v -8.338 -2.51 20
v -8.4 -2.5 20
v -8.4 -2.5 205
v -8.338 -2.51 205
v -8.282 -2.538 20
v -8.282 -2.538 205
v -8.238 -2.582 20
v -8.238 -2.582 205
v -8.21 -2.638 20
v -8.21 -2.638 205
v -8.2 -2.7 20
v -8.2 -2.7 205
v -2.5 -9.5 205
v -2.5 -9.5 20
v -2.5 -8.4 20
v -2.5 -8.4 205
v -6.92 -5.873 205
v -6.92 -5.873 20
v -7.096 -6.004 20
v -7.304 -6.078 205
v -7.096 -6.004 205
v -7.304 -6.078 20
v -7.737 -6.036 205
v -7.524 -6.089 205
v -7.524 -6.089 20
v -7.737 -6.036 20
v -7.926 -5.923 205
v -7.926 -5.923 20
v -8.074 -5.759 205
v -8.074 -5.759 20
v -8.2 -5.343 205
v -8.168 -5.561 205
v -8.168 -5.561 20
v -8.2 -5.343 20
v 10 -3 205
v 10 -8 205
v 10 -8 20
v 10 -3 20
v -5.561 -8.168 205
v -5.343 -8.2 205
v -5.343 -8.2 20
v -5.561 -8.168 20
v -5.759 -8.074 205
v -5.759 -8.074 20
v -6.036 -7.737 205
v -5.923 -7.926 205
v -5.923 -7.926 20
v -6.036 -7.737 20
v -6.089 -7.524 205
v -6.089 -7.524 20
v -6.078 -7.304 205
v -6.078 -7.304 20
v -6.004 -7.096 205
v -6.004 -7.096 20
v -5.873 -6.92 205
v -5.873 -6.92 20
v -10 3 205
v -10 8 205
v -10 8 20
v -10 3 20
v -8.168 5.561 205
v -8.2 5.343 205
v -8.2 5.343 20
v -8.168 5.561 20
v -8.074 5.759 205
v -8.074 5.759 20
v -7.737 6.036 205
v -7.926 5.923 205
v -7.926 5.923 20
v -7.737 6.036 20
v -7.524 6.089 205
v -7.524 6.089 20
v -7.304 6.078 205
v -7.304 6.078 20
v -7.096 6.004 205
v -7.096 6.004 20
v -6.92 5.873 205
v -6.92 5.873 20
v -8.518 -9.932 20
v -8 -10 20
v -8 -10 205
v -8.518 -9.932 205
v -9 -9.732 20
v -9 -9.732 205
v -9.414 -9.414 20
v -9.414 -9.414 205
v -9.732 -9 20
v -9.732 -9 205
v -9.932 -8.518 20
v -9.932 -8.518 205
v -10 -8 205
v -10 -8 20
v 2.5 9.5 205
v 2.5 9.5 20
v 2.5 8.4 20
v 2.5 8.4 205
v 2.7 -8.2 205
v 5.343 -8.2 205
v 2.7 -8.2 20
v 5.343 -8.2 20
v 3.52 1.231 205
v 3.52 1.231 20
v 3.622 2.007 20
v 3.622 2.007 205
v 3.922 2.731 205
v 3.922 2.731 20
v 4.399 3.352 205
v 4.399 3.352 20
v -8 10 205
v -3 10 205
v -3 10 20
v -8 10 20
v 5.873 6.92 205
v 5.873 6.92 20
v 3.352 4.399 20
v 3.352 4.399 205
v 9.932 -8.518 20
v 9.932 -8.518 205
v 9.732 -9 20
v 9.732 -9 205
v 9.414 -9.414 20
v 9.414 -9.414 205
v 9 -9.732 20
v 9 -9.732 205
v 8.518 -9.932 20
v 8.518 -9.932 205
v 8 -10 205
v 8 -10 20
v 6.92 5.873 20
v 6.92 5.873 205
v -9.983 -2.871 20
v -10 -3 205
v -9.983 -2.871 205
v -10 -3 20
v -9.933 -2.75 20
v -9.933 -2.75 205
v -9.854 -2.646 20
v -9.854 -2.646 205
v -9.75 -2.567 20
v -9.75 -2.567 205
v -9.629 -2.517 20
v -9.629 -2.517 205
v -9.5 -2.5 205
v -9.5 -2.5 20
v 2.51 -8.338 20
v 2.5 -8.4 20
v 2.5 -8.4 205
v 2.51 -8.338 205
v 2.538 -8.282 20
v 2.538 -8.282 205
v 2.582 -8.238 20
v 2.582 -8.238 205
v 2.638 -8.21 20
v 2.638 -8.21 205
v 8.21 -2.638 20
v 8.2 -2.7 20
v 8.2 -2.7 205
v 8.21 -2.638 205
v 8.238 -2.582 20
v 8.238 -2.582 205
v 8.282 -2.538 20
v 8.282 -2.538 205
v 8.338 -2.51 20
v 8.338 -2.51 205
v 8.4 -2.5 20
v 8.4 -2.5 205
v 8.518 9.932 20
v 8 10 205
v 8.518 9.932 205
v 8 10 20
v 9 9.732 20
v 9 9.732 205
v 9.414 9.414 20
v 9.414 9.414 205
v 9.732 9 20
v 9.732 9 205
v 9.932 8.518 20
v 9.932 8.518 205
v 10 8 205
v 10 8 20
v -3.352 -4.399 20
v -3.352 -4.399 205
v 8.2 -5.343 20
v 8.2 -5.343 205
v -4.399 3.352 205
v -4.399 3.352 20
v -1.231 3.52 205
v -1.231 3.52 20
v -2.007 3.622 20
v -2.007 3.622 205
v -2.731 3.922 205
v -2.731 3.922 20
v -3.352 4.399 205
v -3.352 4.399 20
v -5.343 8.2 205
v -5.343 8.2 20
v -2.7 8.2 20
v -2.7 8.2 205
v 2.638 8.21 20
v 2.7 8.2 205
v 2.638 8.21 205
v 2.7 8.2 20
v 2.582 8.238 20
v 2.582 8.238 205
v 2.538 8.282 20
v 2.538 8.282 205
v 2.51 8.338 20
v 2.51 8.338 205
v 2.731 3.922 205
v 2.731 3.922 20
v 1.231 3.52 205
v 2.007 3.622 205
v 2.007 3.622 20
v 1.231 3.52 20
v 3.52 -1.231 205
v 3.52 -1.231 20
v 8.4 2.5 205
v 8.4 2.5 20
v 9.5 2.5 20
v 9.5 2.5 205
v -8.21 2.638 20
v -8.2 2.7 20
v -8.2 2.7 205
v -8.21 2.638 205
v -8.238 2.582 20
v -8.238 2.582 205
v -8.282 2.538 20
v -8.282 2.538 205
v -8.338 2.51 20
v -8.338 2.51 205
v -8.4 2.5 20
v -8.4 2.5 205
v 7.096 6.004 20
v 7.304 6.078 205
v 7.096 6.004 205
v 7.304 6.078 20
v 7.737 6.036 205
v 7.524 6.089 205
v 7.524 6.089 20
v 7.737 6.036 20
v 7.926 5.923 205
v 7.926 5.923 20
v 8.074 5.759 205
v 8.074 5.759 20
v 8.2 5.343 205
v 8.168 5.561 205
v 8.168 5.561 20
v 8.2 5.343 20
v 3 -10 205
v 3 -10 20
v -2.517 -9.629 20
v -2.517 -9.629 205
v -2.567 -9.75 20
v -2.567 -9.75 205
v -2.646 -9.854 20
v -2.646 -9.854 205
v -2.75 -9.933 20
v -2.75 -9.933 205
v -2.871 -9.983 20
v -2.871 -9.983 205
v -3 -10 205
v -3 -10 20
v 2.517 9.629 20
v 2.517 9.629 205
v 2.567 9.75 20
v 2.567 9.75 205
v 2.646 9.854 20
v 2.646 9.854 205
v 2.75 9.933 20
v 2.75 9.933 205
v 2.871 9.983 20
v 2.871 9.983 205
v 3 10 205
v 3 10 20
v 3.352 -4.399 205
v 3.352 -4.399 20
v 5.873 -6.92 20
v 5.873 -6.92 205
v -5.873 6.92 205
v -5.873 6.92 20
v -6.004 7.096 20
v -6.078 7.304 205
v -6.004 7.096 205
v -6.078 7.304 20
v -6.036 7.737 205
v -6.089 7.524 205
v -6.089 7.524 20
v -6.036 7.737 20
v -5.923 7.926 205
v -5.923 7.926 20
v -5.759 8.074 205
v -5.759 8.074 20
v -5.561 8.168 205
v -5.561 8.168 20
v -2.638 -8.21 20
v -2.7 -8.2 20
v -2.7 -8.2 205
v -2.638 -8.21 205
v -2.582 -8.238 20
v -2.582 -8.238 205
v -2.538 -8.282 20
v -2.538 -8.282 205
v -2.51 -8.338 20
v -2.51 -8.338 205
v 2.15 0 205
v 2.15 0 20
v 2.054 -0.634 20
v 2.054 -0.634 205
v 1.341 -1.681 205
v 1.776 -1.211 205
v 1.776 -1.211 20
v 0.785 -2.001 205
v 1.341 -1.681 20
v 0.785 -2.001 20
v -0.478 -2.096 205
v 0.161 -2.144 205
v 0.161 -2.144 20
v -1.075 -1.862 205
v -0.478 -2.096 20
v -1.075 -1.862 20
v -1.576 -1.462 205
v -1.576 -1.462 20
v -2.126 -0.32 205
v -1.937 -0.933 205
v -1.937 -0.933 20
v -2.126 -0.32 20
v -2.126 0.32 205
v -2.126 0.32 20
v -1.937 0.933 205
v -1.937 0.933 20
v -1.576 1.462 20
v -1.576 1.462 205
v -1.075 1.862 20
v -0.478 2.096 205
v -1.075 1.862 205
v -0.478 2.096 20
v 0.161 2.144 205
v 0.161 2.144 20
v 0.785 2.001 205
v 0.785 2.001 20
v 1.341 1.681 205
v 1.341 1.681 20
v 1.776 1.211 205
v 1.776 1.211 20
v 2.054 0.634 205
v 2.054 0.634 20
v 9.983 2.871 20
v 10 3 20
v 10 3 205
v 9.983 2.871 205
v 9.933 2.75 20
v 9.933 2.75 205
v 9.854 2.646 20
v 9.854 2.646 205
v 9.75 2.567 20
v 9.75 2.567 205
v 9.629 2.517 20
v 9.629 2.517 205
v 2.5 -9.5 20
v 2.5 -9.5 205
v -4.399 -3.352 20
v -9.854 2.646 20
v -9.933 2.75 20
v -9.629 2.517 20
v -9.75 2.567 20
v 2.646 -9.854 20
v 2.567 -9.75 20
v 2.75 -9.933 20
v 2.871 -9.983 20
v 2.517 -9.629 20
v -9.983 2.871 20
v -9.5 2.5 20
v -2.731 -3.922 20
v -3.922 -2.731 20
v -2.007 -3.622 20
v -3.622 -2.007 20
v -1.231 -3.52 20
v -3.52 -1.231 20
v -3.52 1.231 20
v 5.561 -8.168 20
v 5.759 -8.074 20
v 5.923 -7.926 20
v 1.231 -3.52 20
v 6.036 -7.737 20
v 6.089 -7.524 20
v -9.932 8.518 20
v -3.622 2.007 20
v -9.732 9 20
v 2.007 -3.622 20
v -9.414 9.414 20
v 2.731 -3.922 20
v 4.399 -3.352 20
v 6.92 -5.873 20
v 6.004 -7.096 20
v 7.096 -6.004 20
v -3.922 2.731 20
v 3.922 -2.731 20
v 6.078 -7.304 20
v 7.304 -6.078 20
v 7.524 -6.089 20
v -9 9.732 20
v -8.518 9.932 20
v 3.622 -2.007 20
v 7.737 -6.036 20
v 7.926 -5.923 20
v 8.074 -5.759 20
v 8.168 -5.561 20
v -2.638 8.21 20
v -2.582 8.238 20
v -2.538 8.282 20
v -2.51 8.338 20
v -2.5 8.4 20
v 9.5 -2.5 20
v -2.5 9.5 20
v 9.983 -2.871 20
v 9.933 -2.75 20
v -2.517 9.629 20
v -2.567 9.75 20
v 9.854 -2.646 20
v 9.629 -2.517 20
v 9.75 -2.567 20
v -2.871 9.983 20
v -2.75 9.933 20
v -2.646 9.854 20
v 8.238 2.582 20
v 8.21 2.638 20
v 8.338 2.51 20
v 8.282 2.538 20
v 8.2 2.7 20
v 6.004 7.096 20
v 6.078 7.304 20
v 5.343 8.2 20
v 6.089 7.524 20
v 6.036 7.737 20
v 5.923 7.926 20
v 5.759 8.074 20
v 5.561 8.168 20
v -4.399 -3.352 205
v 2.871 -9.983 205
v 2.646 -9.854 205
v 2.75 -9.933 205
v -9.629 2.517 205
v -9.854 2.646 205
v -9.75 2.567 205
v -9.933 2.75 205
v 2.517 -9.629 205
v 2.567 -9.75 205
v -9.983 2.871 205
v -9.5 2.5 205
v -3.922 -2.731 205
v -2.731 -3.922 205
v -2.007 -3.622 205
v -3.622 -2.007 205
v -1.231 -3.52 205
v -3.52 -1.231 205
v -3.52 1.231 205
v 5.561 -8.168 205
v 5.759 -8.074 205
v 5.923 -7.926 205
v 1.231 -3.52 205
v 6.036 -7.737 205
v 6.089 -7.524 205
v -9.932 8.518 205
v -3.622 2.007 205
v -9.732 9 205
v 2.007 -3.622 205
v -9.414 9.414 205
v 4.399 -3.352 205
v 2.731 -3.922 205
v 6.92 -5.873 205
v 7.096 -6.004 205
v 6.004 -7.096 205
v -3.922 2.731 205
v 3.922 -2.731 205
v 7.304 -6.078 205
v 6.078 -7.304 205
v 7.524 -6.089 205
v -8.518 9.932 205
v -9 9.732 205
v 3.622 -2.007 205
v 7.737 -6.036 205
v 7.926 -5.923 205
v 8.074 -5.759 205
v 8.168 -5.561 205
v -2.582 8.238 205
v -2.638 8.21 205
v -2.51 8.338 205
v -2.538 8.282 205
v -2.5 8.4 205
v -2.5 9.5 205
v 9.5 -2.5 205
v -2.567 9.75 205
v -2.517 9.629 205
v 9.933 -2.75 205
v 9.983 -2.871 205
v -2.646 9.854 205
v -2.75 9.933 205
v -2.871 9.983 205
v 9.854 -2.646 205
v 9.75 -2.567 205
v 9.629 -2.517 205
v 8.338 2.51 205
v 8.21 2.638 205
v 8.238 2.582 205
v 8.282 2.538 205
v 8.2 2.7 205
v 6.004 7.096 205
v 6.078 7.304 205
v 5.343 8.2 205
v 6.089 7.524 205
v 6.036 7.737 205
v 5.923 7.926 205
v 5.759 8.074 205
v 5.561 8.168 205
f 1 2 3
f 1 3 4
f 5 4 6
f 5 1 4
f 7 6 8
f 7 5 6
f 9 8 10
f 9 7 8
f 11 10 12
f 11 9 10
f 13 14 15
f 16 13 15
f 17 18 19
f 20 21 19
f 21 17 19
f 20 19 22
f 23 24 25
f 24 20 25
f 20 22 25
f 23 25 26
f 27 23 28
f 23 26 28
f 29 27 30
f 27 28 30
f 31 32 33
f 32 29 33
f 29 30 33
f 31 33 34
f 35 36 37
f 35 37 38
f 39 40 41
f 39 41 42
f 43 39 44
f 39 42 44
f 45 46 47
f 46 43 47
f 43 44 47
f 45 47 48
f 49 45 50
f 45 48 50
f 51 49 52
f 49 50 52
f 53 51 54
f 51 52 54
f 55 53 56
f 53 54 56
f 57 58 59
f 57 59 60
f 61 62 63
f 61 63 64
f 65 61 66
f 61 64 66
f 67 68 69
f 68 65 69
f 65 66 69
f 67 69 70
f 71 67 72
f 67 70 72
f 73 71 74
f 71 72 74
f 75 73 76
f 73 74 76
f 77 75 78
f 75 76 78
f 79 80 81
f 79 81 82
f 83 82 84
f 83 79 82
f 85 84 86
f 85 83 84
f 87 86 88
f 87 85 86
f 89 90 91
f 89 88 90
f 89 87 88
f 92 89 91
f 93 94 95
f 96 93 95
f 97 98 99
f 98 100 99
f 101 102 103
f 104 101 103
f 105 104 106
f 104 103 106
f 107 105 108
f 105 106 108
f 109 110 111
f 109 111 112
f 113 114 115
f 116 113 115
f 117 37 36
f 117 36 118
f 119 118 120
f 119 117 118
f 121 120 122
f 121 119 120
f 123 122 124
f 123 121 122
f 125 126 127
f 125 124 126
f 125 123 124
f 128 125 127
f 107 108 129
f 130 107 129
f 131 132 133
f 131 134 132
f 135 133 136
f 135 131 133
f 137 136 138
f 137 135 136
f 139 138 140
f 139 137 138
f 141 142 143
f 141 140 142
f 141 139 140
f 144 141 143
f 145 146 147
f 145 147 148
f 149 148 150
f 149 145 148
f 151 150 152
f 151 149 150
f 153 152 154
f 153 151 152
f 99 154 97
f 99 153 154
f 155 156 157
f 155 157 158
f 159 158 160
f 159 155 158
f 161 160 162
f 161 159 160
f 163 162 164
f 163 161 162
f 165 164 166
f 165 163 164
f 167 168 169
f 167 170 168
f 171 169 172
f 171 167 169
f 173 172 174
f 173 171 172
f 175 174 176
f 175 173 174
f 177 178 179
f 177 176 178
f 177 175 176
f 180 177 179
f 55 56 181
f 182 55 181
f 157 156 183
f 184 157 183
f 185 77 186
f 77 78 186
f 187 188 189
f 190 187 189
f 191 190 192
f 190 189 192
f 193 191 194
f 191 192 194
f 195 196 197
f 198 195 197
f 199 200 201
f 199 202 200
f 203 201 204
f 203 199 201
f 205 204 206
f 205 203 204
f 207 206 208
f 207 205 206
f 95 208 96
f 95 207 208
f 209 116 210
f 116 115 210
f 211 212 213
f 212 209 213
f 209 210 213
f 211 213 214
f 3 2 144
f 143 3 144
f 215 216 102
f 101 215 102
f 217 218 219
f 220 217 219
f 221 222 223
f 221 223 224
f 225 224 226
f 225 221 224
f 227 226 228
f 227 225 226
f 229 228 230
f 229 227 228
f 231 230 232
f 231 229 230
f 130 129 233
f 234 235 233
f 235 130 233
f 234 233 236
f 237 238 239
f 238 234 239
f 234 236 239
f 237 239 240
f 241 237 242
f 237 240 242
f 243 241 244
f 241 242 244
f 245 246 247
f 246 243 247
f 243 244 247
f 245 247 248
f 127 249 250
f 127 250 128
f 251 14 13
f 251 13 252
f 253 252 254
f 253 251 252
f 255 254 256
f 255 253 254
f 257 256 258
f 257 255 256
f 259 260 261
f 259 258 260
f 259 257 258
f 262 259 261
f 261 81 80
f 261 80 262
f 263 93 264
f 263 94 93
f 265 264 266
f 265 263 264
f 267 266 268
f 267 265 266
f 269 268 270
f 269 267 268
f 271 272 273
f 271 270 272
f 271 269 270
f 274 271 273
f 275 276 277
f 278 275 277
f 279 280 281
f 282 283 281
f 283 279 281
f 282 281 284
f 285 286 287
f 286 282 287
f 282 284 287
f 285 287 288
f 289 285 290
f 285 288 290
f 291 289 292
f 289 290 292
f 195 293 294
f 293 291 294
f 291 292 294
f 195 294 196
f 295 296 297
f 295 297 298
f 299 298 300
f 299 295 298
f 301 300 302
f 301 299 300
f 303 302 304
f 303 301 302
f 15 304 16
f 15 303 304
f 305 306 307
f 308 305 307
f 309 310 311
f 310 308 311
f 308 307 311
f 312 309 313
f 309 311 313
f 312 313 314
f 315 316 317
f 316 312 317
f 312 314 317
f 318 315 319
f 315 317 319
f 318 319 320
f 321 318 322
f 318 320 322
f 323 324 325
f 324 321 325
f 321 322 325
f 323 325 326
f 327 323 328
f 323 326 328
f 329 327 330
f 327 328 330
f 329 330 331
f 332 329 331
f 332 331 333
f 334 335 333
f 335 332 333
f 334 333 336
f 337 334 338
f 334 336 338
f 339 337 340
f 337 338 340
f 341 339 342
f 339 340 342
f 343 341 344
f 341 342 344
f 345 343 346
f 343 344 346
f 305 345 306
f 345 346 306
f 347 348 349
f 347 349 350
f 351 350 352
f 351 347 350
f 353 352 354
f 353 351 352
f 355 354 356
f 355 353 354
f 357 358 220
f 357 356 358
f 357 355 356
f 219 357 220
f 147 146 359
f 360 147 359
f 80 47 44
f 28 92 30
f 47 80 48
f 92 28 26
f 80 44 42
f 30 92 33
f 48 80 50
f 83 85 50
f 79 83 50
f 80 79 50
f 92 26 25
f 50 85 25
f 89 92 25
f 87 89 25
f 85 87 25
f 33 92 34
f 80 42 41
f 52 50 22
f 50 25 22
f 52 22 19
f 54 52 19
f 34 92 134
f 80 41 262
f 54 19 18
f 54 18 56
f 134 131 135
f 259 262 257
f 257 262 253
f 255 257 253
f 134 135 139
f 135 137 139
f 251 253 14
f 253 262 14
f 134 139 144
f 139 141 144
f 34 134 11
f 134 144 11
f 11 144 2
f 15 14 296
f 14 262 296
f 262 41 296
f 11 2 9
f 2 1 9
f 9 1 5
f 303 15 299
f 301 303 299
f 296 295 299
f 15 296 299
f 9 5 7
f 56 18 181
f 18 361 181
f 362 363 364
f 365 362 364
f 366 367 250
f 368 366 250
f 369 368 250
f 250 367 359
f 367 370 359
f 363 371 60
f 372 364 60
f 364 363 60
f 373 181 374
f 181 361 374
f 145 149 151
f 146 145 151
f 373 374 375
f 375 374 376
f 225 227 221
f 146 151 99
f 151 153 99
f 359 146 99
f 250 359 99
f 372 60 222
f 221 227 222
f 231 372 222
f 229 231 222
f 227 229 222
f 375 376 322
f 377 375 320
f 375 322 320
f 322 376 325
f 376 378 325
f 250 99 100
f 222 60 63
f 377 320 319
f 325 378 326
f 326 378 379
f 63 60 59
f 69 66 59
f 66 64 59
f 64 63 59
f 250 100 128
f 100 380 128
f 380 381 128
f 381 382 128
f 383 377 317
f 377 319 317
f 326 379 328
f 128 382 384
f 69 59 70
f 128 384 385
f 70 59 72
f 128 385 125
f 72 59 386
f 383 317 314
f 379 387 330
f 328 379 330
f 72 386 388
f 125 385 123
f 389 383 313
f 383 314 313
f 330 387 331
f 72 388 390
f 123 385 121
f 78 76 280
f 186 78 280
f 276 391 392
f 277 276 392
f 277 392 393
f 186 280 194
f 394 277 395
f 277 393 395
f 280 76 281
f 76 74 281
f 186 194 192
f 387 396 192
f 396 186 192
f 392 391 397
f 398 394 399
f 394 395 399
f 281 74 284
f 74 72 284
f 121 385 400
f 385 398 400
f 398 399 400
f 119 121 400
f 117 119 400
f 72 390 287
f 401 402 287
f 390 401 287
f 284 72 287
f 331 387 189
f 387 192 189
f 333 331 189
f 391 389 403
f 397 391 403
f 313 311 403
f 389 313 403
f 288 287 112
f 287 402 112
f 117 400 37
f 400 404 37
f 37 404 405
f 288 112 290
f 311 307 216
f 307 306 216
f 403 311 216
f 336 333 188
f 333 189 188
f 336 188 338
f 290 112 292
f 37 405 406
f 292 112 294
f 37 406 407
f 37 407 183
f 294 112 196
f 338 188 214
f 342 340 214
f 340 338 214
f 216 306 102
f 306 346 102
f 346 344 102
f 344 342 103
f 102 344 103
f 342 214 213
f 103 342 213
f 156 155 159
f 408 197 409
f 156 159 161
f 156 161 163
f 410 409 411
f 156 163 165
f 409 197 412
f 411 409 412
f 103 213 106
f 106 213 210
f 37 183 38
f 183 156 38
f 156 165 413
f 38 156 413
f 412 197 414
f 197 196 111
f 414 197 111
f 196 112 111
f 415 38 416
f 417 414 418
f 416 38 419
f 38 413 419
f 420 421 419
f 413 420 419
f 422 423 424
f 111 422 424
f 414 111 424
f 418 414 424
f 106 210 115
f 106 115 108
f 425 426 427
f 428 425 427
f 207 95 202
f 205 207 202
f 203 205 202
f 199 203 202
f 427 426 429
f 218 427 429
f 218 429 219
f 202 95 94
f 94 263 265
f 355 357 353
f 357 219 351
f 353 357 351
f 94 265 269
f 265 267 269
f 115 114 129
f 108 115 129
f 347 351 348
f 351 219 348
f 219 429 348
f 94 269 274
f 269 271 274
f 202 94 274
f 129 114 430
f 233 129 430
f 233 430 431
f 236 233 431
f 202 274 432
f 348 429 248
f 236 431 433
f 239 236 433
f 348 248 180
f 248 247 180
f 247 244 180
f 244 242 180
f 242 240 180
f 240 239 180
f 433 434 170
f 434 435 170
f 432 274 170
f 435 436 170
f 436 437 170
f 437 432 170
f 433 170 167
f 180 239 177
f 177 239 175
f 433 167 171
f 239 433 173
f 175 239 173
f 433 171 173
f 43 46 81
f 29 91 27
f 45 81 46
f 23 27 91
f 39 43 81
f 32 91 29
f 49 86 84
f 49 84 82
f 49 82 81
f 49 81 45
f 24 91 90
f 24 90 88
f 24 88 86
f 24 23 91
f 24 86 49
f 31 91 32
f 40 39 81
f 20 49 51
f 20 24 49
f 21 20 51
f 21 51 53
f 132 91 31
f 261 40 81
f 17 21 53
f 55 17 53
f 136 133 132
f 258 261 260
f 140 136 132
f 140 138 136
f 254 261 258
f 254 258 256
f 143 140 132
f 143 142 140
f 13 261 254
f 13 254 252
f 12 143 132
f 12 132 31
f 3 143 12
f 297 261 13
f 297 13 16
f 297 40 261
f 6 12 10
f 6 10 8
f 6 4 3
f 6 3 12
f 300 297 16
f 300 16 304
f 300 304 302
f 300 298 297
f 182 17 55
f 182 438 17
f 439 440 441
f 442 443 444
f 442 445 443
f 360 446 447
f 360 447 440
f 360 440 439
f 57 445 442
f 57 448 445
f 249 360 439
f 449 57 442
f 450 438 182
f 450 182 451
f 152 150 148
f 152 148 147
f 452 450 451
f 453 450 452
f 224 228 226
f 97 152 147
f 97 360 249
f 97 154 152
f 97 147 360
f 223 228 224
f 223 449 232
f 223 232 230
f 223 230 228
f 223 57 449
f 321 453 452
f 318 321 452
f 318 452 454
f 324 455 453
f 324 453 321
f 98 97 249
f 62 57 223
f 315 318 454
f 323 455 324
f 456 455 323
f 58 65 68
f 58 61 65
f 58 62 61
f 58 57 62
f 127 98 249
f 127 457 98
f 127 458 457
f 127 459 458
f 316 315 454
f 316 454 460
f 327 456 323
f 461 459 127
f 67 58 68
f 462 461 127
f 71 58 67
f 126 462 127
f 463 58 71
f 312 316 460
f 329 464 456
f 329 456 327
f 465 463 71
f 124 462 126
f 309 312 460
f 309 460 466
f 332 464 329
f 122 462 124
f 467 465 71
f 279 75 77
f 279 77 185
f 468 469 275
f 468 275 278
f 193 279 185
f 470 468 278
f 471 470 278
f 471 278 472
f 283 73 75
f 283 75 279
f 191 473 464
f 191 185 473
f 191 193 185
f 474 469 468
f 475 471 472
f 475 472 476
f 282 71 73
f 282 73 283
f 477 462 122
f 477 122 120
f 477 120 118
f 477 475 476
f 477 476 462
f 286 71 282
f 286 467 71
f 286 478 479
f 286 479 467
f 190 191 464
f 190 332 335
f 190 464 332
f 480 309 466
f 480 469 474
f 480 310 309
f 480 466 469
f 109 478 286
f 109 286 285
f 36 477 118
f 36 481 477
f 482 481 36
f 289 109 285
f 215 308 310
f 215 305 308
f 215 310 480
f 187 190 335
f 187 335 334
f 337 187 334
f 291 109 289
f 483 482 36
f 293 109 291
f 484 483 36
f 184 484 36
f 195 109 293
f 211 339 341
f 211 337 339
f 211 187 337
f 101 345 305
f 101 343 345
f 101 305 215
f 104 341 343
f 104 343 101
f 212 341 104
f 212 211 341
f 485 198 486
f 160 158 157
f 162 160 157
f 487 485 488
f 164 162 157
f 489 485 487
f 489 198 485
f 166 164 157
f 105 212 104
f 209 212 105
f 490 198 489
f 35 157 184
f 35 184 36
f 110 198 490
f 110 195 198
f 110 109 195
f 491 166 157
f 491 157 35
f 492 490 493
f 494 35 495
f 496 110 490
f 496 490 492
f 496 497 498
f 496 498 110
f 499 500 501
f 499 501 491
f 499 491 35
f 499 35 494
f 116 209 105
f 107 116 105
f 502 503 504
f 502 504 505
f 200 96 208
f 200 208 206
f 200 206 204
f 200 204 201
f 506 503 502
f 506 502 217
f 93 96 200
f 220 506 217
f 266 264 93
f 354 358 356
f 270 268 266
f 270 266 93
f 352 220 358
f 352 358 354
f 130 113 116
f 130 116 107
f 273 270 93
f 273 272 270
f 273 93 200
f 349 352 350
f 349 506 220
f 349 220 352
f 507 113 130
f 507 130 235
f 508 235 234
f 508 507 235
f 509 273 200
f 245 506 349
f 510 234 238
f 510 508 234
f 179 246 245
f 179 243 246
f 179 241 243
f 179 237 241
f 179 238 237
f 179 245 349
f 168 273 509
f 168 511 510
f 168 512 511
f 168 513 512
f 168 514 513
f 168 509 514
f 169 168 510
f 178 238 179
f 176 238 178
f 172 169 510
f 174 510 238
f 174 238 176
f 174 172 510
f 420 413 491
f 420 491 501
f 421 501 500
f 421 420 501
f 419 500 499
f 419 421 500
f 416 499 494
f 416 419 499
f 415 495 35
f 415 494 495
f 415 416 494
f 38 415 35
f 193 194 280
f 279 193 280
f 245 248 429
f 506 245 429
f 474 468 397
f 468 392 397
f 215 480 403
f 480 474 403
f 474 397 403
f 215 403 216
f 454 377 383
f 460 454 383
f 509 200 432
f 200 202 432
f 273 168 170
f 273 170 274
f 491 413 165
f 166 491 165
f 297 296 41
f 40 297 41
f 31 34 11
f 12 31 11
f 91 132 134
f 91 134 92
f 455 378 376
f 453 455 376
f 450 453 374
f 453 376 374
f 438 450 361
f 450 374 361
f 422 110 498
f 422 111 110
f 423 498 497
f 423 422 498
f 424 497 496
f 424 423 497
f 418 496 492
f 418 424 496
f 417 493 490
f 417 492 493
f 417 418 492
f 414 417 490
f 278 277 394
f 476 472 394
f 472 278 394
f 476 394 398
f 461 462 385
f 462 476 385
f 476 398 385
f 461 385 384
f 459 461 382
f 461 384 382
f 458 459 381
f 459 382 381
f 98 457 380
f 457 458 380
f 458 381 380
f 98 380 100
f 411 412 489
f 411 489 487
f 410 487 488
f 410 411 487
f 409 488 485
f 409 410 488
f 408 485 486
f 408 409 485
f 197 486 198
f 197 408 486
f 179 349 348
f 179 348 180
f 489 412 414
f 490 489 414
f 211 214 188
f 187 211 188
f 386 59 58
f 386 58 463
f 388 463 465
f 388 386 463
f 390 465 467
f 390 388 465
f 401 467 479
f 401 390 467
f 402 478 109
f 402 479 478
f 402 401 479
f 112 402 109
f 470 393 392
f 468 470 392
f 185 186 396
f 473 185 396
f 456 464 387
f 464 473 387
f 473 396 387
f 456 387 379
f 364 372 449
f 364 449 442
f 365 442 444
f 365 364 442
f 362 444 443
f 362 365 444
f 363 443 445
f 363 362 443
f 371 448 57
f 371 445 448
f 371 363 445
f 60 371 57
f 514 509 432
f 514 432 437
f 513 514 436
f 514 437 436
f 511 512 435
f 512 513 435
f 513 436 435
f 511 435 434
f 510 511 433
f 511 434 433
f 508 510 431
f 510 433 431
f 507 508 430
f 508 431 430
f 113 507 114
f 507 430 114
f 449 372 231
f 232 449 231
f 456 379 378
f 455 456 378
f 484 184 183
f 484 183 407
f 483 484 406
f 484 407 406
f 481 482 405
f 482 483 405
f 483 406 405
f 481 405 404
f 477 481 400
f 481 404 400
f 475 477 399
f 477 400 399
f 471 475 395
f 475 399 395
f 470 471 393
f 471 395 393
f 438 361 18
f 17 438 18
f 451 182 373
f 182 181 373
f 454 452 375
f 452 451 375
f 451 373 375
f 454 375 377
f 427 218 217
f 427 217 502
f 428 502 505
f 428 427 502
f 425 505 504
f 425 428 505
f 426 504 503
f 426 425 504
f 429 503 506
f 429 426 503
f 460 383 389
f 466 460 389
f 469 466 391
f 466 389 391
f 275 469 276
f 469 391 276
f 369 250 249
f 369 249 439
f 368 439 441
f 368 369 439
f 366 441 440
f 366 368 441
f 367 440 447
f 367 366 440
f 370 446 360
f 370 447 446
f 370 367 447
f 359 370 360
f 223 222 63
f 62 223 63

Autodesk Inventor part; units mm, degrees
ref_plane "Płaszczyzna początkowa" through (0, 0, 20) normal (0, 0, 1) x (1, 0, 0)
ref_plane "Płaszczyzna końcowa" through (0, 0, 205) normal (0, 0, 1) x (1, 0, 0)
sketch "Szkic" plane through (0, 0, 0) normal (0, 0, 1) x (1, 0, 0)
  arc A0 (8, -10) -> (10, -8) centre (8, -8) ccw
  line L0 (10, -8) -> (10, -3)
  arc A1 (10, -3) -> (9.5, -2.5) centre (9.5, -3) ccw
  line L1 (9.5, -2.5) -> (8.4, -2.5)
  arc A2 (8.4, -2.5) -> (8.2, -2.7) centre (8.4, -2.7) ccw
  line L2 (8.2, -2.7) -> (8.2, -5.3428)
  arc A3 (6.9197, -5.8732) -> (8.2, -5.3428) centre (7.45, -5.3428) ccw
  line L3 (6.9197, -5.8732) -> (4.3987, -3.3522)
  arc A4 (3.52, -1.2308) -> (4.3987, -3.3522) centre (6.52, -1.2308) ccw
  line L4 (3.52, -1.2308) -> (3.52, 1.2308)
  arc A5 (4.3987, 3.3522) -> (3.52, 1.2308) centre (6.52, 1.2308) ccw
  line L5 (4.3987, 3.3522) -> (6.9197, 5.8732)
  arc A6 (8.2, 5.3428) -> (6.9197, 5.8732) centre (7.45, 5.3428) ccw
  line L6 (8.2, 5.3428) -> (8.2, 2.7)
  arc A7 (8.2, 2.7) -> (8.4, 2.5) centre (8.4, 2.7) ccw
  line L7 (8.4, 2.5) -> (9.5, 2.5)
  arc A8 (9.5, 2.5) -> (10, 3) centre (9.5, 3) ccw
  line L8 (10, 3) -> (10, 8)
  arc A9 (10, 8) -> (8, 10) centre (8, 8) ccw
  line L9 (8, 10) -> (3, 10)
  arc A10 (3, 10) -> (2.5, 9.5) centre (3, 9.5) ccw
  line L10 (2.5, 9.5) -> (2.5, 8.4)
  arc A11 (2.5, 8.4) -> (2.7, 8.2) centre (2.7, 8.4) ccw
  line L11 (2.7, 8.2) -> (5.3428, 8.2)
  arc A12 (5.8732, 6.9197) -> (5.3428, 8.2) centre (5.3428, 7.45) ccw
  line L12 (5.8732, 6.9197) -> (3.3522, 4.3987)
  arc A13 (1.2308, 3.52) -> (3.3522, 4.3987) centre (1.2308, 6.52) ccw
  line L13 (1.2308, 3.52) -> (-1.2308, 3.52)
  arc A14 (-3.3522, 4.3987) -> (-1.2308, 3.52) centre (-1.2308, 6.52) ccw
  line L14 (-3.3522, 4.3987) -> (-5.8732, 6.9197)
  arc A15 (-5.3428, 8.2) -> (-5.8732, 6.9197) centre (-5.3428, 7.45) ccw
  line L15 (-5.3428, 8.2) -> (-2.7, 8.2)
  arc A16 (-2.7, 8.2) -> (-2.5, 8.4) centre (-2.7, 8.4) ccw
  line L16 (-2.5, 8.4) -> (-2.5, 9.5)
  arc A17 (-2.5, 9.5) -> (-3, 10) centre (-3, 9.5) ccw
  line L17 (-3, 10) -> (-8, 10)
  arc A18 (-8, 10) -> (-10, 8) centre (-8, 8) ccw
  line L18 (-10, 8) -> (-10, 3)
  arc A19 (-10, 3) -> (-9.5, 2.5) centre (-9.5, 3) ccw
  line L19 (-9.5, 2.5) -> (-8.4, 2.5)
  arc A20 (-8.4, 2.5) -> (-8.2, 2.7) centre (-8.4, 2.7) ccw
  line L20 (-8.2, 2.7) -> (-8.2, 5.3428)
  arc A21 (-6.9197, 5.8732) -> (-8.2, 5.3428) centre (-7.45, 5.3428) ccw
  line L21 (-6.9197, 5.8732) -> (-4.3987, 3.3522)
  arc A22 (-3.52, 1.2308) -> (-4.3987, 3.3522) centre (-6.52, 1.2308) ccw
  line L22 (-3.52, 1.2308) -> (-3.52, -1.2308)
  arc A23 (-4.3987, -3.3522) -> (-3.52, -1.2308) centre (-6.52, -1.2308) ccw
  line L23 (-4.3987, -3.3522) -> (-6.9197, -5.8732)
  arc A24 (-8.2, -5.3428) -> (-6.9197, -5.8732) centre (-7.45, -5.3428) ccw
  line L24 (-8.2, -5.3428) -> (-8.2, -2.7)
  arc A25 (-8.2, -2.7) -> (-8.4, -2.5) centre (-8.4, -2.7) ccw
  line L25 (-8.4, -2.5) -> (-9.5, -2.5)
  arc A26 (-9.5, -2.5) -> (-10, -3) centre (-9.5, -3) ccw
  line L26 (-10, -3) -> (-10, -8)
  arc A27 (-10, -8) -> (-8, -10) centre (-8, -8) ccw
  line L27 (-8, -10) -> (-3, -10)
  arc A28 (-3, -10) -> (-2.5, -9.5) centre (-3, -9.5) ccw
  line L28 (-2.5, -9.5) -> (-2.5, -8.4)
  arc A29 (-2.5, -8.4) -> (-2.7, -8.2) centre (-2.7, -8.4) ccw
  line L29 (-2.7, -8.2) -> (-5.3428, -8.2)
  arc A30 (-5.8732, -6.9197) -> (-5.3428, -8.2) centre (-5.3428, -7.45) ccw
  line L30 (-5.8732, -6.9197) -> (-3.3522, -4.3987)
  arc A31 (-1.2308, -3.52) -> (-3.3522, -4.3987) centre (-1.2308, -6.52) ccw
  line L31 (-1.2308, -3.52) -> (1.2308, -3.52)
  arc A32 (3.3522, -4.3987) -> (1.2308, -3.52) centre (1.2308, -6.52) ccw
  line L32 (3.3522, -4.3987) -> (5.8732, -6.9197)
  arc A33 (5.3428, -8.2) -> (5.8732, -6.9197) centre (5.3428, -7.45) ccw
  line L33 (5.3428, -8.2) -> (2.7, -8.2)
  arc A34 (2.7, -8.2) -> (2.5, -8.4) centre (2.7, -8.4) ccw
  line L34 (2.5, -8.4) -> (2.5, -9.5)
  arc A35 (2.5, -9.5) -> (3, -10) centre (3, -9.5) ccw
  line L35 (3, -10) -> (8, -10)
  circle A36 centre (0, 0) radius 2.15
  point P0 (10, -10)
extrude "Bryła" add sketch "Szkic" along normal up to surface (185 mm away) from surface at 20
sketch "Szkic4" plane through (0, 0, 0) normal (0, 0, 1) x (1, 0, 0)
  line L0 (0, 0) -> (10, 0)
ref_plane "Płaszczyzna konstrukcyjna4" through (0, 0, 0) normal (0, -1, 0) x (1, 0, 0)
sketch "Szkic5" plane through (0, 0, 0) normal (0, -1, 0) x (1, 0, 0)
  line L0 (-2, 20) -> (12, 20)
  line L1 (-2, 205) -> (12, 205)
  dimension "d7" = 185
ref_plane "Płaszczyzna konstrukcyjna5" through (225, 3, 20) normal (0, 0, -1) x (-1, 0, 0)
split "Podział1" plane through (225, 3, 20) removes the side toward (0, 0, -1)
ref_plane "Płaszczyzna konstrukcyjna6" through (-230, 3, 205) normal (0, 0, 1) x (1, 0, 0)
split "Podział2" plane through (-230, 3, 205) removes the side toward (0, 0, 1)
equation "\"d3\" = Length + G_OFFSET_END"
equation "\"G_L\" = d7"
equation "\"Length\" = 215"
equation "\"G_OFFSET_END\" = -10"
properties part number "COTS_ARMA_AR3701_20x20_Alu_Extr_00000012" material "Aluminium 6061-AHC"
